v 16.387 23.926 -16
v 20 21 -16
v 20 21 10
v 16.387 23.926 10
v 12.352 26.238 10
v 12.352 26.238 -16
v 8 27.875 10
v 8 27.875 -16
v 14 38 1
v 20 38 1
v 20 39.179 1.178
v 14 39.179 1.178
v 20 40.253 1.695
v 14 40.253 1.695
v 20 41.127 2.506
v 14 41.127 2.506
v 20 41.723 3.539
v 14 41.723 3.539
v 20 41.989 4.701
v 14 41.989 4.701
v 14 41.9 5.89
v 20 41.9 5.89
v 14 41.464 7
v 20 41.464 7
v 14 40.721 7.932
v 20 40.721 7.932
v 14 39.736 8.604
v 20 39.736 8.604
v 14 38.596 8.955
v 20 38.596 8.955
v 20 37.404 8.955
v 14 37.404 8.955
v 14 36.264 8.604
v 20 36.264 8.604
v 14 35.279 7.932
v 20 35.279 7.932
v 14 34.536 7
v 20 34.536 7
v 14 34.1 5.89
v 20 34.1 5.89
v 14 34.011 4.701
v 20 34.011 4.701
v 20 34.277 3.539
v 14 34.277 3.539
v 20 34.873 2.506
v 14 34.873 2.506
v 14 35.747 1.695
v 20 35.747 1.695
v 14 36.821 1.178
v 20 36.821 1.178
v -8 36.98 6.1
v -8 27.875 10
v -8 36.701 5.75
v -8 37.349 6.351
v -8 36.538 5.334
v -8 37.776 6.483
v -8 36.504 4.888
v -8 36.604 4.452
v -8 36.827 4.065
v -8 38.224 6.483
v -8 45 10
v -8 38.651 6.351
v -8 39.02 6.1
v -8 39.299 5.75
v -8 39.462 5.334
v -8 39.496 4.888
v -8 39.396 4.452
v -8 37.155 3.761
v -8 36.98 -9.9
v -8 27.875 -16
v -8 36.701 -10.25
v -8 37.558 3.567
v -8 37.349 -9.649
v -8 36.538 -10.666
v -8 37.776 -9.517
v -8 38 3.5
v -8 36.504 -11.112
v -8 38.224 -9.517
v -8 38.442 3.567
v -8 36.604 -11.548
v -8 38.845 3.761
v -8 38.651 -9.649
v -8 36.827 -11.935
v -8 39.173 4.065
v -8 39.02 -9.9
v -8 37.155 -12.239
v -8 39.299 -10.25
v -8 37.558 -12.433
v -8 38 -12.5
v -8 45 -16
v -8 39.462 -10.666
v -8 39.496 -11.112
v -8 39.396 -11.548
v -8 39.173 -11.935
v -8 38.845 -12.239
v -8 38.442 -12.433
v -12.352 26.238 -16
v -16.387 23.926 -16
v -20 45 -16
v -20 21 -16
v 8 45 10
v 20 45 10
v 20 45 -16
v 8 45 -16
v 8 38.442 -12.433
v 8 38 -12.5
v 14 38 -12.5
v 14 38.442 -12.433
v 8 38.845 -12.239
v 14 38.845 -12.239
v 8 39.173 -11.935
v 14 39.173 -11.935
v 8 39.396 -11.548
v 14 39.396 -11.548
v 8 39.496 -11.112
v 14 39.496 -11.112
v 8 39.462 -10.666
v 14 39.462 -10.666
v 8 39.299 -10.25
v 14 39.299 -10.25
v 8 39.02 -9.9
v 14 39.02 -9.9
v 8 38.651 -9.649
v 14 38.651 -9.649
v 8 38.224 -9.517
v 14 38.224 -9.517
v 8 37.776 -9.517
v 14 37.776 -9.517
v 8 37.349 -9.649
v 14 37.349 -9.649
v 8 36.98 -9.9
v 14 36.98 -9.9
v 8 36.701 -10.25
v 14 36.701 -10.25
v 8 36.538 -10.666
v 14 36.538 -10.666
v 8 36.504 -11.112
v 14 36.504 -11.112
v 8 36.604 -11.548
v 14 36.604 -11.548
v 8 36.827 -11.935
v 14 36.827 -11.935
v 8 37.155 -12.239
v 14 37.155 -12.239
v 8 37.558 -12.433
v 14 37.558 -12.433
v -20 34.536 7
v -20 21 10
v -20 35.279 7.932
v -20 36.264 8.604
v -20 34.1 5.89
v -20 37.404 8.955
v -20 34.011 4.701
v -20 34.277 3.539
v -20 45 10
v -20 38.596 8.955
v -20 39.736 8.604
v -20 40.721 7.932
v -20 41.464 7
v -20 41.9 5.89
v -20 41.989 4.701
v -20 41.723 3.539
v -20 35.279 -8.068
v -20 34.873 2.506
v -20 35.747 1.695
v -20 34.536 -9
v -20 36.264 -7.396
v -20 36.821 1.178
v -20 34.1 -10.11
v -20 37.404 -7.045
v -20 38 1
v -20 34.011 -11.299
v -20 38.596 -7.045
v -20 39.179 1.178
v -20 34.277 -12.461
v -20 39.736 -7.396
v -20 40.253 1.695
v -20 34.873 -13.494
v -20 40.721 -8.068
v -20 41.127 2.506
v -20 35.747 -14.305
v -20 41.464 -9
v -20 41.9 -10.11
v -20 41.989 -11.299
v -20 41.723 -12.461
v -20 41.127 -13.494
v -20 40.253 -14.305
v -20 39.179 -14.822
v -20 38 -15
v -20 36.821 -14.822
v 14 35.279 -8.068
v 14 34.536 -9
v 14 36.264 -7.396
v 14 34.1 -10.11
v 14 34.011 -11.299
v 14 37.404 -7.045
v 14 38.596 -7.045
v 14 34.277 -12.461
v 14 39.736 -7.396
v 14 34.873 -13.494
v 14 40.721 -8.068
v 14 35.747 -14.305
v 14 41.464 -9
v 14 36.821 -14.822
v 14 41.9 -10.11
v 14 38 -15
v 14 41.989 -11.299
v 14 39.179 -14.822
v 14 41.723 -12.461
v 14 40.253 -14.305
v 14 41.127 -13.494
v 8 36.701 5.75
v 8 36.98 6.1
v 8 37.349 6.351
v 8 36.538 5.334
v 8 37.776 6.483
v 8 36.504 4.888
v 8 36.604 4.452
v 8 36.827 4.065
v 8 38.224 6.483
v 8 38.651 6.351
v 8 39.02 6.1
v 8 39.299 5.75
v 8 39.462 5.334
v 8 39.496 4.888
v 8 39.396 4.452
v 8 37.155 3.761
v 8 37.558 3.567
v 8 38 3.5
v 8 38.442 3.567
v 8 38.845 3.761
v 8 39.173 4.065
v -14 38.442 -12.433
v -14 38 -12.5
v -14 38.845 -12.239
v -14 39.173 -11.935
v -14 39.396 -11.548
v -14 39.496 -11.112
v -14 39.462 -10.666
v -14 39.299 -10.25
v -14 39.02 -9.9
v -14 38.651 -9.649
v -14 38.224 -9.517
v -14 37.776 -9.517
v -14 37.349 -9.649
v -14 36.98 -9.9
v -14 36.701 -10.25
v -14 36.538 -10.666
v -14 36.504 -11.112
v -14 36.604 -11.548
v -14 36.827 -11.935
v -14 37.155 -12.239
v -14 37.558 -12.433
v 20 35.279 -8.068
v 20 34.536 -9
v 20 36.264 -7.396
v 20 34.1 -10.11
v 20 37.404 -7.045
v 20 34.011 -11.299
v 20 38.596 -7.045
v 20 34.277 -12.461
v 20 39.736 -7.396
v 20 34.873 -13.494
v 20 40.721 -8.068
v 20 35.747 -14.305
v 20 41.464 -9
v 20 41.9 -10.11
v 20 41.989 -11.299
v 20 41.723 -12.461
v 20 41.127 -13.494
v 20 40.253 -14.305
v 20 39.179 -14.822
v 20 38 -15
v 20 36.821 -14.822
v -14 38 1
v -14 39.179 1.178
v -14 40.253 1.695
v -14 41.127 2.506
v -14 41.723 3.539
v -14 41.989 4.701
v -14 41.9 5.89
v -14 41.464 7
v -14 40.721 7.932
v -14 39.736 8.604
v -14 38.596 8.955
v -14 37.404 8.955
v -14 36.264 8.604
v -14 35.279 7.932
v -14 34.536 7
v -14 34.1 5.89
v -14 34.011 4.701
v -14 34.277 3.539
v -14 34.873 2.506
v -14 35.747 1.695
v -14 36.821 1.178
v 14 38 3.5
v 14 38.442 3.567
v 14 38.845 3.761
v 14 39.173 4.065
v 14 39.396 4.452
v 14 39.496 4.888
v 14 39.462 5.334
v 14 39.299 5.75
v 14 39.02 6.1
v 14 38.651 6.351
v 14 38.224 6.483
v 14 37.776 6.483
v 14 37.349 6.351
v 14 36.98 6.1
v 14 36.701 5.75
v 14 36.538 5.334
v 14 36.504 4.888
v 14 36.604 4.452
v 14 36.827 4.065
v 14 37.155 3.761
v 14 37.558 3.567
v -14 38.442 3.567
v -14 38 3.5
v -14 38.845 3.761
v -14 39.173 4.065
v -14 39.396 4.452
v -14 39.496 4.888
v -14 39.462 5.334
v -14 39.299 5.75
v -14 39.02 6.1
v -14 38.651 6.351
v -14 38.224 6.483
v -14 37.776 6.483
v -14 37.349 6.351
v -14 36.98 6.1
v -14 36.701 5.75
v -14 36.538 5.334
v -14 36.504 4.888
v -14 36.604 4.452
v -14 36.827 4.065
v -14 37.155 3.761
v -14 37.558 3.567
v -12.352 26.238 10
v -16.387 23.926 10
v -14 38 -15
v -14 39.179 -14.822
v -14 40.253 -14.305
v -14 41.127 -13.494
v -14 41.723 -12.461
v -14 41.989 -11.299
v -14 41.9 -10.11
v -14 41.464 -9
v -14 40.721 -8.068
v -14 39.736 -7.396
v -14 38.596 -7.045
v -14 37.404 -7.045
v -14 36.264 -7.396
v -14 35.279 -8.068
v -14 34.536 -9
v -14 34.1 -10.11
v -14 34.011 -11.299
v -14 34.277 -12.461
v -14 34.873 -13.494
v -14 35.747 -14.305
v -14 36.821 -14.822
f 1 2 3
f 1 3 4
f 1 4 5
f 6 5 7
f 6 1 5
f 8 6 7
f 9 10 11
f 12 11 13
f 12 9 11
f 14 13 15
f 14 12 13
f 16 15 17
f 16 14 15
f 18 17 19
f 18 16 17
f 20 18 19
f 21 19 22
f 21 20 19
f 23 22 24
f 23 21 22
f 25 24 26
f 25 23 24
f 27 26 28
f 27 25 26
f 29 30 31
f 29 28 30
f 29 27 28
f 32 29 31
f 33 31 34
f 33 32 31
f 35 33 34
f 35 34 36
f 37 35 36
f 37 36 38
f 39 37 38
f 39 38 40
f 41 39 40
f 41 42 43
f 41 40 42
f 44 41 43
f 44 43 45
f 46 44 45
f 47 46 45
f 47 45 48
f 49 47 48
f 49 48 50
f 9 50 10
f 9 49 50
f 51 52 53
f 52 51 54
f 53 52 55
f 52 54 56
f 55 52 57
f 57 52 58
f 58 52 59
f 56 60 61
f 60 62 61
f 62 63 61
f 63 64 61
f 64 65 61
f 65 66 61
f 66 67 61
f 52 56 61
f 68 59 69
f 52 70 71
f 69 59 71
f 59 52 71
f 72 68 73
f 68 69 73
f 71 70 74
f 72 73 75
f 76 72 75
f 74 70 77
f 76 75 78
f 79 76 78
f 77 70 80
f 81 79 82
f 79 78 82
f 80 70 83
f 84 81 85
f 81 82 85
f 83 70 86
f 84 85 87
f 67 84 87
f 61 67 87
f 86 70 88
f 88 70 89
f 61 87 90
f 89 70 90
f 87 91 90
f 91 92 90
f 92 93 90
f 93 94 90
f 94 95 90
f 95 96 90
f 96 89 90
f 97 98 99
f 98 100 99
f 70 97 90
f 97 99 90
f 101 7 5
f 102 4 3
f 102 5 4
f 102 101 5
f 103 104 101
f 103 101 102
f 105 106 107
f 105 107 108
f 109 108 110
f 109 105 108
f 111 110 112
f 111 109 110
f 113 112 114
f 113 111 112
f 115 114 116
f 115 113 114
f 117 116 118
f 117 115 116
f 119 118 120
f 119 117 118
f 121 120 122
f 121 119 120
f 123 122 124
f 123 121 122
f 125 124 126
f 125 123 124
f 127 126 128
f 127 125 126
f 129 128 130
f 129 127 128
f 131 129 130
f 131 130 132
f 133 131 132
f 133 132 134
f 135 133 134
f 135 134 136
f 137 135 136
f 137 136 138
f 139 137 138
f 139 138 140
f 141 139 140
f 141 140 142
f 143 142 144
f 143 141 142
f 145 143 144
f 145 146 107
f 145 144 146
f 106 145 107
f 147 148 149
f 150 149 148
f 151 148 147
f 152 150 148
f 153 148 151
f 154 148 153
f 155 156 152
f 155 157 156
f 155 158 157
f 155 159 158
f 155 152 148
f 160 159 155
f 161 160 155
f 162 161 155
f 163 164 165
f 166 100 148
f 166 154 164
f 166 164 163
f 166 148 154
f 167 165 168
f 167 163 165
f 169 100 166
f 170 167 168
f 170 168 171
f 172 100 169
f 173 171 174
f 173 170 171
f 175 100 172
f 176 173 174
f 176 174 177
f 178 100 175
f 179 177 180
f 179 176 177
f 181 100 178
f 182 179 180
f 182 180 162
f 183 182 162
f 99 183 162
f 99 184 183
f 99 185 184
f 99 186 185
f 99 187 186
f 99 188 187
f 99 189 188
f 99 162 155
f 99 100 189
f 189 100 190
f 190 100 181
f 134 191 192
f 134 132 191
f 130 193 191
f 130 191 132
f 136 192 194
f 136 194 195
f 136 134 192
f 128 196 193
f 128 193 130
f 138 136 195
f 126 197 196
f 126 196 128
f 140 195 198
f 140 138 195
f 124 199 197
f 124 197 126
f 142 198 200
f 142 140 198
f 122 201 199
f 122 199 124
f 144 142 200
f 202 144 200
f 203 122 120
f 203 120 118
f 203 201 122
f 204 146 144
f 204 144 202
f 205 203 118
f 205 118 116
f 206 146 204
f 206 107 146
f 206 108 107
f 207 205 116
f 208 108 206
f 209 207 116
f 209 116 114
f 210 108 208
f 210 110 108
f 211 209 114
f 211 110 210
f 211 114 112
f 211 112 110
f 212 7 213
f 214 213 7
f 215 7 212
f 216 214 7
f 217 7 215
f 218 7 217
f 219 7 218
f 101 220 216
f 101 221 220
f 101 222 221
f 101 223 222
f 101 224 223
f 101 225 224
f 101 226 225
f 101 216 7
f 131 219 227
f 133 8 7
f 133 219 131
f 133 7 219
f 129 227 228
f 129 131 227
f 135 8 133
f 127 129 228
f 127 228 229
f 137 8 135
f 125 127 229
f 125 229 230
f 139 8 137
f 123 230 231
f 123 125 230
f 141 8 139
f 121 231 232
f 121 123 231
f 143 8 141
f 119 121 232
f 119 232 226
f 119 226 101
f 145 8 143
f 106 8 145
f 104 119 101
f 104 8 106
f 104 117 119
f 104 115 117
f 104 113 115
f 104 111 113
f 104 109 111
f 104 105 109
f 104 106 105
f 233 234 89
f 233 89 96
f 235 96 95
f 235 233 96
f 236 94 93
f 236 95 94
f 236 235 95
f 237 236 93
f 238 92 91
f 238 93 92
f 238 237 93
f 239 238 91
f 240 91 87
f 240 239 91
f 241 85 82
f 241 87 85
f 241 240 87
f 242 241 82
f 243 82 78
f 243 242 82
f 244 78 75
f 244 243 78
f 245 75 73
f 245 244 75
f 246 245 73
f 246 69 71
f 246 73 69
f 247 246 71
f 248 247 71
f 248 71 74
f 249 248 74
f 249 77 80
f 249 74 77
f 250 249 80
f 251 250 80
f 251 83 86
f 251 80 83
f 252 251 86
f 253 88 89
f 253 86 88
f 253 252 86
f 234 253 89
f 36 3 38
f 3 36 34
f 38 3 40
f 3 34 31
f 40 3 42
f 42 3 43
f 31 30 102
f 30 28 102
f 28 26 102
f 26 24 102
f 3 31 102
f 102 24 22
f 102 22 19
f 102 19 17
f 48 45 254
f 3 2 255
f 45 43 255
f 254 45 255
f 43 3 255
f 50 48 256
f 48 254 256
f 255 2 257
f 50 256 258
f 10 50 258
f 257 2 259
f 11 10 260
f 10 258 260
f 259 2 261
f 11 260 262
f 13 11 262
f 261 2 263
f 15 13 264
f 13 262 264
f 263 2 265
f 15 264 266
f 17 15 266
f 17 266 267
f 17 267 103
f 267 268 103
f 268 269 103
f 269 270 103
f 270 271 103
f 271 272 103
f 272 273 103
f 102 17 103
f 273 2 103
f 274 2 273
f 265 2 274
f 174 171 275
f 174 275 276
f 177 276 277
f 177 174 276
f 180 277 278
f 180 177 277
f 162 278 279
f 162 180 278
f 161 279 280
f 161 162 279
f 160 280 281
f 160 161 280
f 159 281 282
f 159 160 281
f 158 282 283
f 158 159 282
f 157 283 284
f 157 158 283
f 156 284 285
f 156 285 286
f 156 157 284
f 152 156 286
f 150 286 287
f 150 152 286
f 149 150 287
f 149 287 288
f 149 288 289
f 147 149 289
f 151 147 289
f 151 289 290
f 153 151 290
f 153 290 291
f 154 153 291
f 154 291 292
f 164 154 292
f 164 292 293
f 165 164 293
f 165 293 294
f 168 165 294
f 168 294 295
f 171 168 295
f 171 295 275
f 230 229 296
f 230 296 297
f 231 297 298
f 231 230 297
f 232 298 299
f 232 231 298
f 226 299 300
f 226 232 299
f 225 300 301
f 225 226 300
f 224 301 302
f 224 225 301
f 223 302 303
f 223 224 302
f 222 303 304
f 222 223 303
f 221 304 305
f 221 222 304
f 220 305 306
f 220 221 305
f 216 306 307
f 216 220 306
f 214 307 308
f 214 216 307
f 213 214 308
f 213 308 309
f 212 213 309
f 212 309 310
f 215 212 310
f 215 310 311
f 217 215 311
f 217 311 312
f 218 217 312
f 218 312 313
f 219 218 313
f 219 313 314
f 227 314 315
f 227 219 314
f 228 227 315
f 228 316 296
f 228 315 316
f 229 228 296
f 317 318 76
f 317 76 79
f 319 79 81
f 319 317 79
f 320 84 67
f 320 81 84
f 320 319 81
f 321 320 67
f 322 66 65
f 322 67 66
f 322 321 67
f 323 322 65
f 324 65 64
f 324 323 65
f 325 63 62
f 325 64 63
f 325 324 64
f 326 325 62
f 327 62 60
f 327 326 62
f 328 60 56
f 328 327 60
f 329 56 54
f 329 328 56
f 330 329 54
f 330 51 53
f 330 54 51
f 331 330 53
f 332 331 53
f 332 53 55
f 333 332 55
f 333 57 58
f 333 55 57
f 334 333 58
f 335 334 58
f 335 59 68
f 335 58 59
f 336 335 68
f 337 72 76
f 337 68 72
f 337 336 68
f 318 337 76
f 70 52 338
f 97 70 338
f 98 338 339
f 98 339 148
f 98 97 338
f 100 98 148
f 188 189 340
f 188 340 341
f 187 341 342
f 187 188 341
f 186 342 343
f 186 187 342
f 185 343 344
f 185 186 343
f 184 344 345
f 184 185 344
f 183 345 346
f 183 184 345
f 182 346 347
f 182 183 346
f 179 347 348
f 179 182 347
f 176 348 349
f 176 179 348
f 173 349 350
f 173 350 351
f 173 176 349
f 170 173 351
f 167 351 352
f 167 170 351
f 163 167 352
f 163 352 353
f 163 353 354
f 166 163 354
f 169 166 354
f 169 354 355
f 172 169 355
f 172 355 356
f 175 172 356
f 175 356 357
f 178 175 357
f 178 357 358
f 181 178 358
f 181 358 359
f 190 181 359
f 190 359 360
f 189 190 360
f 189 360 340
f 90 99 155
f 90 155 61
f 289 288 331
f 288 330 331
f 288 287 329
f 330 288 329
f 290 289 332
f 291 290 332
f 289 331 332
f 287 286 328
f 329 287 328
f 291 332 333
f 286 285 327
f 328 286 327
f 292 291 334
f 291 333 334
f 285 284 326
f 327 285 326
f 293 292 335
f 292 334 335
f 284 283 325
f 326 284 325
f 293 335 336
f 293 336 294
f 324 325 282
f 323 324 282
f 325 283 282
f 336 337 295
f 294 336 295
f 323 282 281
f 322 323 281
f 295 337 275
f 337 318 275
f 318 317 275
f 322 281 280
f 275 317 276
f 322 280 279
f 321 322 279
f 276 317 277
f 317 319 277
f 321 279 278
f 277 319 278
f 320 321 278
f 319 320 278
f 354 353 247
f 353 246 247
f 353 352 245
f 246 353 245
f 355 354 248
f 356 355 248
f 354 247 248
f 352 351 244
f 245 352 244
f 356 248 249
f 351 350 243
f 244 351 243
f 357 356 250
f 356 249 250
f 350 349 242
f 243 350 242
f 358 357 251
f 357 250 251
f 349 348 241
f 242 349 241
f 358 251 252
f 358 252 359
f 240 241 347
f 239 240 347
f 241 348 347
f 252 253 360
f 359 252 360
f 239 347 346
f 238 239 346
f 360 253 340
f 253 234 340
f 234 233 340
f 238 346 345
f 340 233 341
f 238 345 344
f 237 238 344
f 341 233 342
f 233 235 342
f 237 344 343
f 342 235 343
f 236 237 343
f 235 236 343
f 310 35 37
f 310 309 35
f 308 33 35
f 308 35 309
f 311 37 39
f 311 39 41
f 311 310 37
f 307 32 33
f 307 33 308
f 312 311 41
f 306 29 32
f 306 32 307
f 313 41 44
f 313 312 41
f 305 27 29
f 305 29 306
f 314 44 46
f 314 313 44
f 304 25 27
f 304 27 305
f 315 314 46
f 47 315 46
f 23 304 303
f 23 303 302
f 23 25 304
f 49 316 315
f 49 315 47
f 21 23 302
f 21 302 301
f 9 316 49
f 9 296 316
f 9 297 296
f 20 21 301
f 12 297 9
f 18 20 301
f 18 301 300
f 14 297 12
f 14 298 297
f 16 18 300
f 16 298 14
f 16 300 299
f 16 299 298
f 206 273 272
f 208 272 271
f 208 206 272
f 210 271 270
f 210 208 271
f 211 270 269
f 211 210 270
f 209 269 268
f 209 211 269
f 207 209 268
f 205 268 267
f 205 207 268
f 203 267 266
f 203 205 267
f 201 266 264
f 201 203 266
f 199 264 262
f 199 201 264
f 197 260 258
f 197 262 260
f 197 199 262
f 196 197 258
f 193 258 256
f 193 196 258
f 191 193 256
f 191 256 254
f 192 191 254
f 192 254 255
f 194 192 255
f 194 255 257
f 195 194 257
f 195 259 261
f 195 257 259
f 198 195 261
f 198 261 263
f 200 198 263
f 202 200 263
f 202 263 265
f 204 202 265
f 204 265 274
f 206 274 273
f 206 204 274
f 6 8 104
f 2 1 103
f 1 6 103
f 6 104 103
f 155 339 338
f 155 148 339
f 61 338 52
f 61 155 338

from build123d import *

# Parameters (mm, degrees)
CYLINDER143_R     = 1.5
CYLINDER143_DEPTH = 20
CYLINDER142_R     = 1.5
CYLINDER142_DEPTH = 20
CYLINDER145_R     = 4
CYLINDER145_DEPTH = 20
CYLINDER144_R     = 4
CYLINDER144_DEPTH = 20
CYLINDER139_R     = 1.5
CYLINDER139_DEPTH = 20
CYLINDER138_R     = 1.5
CYLINDER138_DEPTH = 20
CYLINDER141_R     = 4
CYLINDER141_DEPTH = 20
CYLINDER140_R     = 4
CYLINDER140_DEPTH = 20
BOX057_W          = 16
BOX057_H          = 25
BOX057_DEPTH      = 26
CYLINDER136_R     = 29
CYLINDER136_DEPTH = 26
BOX055_W          = 40
BOX055_H          = 30
BOX055_DEPTH      = 26


with BuildPart() as v_lec143:
    # Cylinder143 → Cylinder143 (new body)
    with BuildSketch(Plane(origin=(4, 38, -11), x_dir=(0, 0, -1), z_dir=(1, 0, 0))):
        Circle(CYLINDER143_R)
    extrude(amount=CYLINDER143_DEPTH)


with BuildPart() as compound045:
    # Cylinder142 → Cylinder142 (new body)
    with BuildSketch(Plane(origin=(4, 38, 5), x_dir=(0, 0, -1), z_dir=(1, 0, 0))):
        Circle(CYLINDER142_R)
    extrude(amount=CYLINDER142_DEPTH)

    # Compound045: union Válec143
    add(v_lec143.part)


with BuildPart() as v_lec145:
    # Cylinder145 → Cylinder145 (new body)
    with BuildSketch(Plane(origin=(14, 38, -11), x_dir=(0, 0, -1), z_dir=(1, 0, 0))):
        Circle(CYLINDER145_R)
    extrude(amount=CYLINDER145_DEPTH)


with BuildPart() as compound044:
    # Cylinder144 → Cylinder144 (new body)
    with BuildSketch(Plane(origin=(14, 38, 5), x_dir=(0, 0, -1), z_dir=(1, 0, 0))):
        Circle(CYLINDER144_R)
    extrude(amount=CYLINDER144_DEPTH)

    # Compound044: union Válec145
    add(v_lec145.part)


with BuildPart() as v_lec139:
    # Cylinder139 → Cylinder139 (new body)
    with BuildSketch(Plane(origin=(-24, 38, -11), x_dir=(0, 0, -1), z_dir=(1, 0, 0))):
        Circle(CYLINDER139_R)
    extrude(amount=CYLINDER139_DEPTH)


with BuildPart() as compound043:
    # Cylinder138 → Cylinder138 (new body)
    with BuildSketch(Plane(origin=(-24, 38, 5), x_dir=(0, 0, -1), z_dir=(1, 0, 0))):
        Circle(CYLINDER138_R)
    extrude(amount=CYLINDER138_DEPTH)

    # Compound043: union Válec139
    add(v_lec139.part)


with BuildPart() as v_lec141:
    # Cylinder141 → Cylinder141 (new body)
    with BuildSketch(Plane(origin=(-34, 38, -11), x_dir=(0, 0, -1), z_dir=(1, 0, 0))):
        Circle(CYLINDER141_R)
    extrude(amount=CYLINDER141_DEPTH)


with BuildPart() as compound042:
    # Cylinder140 → Cylinder140 (new body)
    with BuildSketch(Plane(origin=(-34, 38, 5), x_dir=(0, 0, -1), z_dir=(1, 0, 0))):
        Circle(CYLINDER140_R)
    extrude(amount=CYLINDER140_DEPTH)

    # Compound042: union Válec141
    add(v_lec141.part)


with BuildPart() as krychle057:
    # Box057 → Box057 (new body)
    with BuildSketch(Plane(origin=(-8, 20, -16), x_dir=(1, 0, 0), z_dir=(0, 0, 1))):
        with Locations((8, 12.5)):
            Rectangle(BOX057_W, BOX057_H)
    extrude(amount=BOX057_DEPTH)


with BuildPart() as v_lec136:
    # Cylinder136 → Cylinder136 (new body)
    with BuildSketch(Plane.XY.offset(-16)):
        Circle(CYLINDER136_R)
    extrude(amount=CYLINDER136_DEPTH)


with BuildPart() as cut051:
    # Box055 → Box055 (new body)
    with BuildSketch(Plane(origin=(-20, 15, -16), x_dir=(1, 0, 0), z_dir=(0, 0, 1))):
        with Locations((20, 15)):
            Rectangle(BOX055_W, BOX055_H)
    extrude(amount=BOX055_DEPTH)

    # Cut045: cut Válec136
    add(v_lec136.part, mode=Mode.SUBTRACT)

    # Cut047: cut Krychle057
    add(krychle057.part, mode=Mode.SUBTRACT)

    # Cut048: cut Compound042
    add(compound042.part, mode=Mode.SUBTRACT)

    # Cut049: cut Compound043
    add(compound043.part, mode=Mode.SUBTRACT)

    # Cut050: cut Compound044
    add(compound044.part, mode=Mode.SUBTRACT)

    # Cut051: cut Compound045
    add(compound045.part, mode=Mode.SUBTRACT)


solid = cut051.part
